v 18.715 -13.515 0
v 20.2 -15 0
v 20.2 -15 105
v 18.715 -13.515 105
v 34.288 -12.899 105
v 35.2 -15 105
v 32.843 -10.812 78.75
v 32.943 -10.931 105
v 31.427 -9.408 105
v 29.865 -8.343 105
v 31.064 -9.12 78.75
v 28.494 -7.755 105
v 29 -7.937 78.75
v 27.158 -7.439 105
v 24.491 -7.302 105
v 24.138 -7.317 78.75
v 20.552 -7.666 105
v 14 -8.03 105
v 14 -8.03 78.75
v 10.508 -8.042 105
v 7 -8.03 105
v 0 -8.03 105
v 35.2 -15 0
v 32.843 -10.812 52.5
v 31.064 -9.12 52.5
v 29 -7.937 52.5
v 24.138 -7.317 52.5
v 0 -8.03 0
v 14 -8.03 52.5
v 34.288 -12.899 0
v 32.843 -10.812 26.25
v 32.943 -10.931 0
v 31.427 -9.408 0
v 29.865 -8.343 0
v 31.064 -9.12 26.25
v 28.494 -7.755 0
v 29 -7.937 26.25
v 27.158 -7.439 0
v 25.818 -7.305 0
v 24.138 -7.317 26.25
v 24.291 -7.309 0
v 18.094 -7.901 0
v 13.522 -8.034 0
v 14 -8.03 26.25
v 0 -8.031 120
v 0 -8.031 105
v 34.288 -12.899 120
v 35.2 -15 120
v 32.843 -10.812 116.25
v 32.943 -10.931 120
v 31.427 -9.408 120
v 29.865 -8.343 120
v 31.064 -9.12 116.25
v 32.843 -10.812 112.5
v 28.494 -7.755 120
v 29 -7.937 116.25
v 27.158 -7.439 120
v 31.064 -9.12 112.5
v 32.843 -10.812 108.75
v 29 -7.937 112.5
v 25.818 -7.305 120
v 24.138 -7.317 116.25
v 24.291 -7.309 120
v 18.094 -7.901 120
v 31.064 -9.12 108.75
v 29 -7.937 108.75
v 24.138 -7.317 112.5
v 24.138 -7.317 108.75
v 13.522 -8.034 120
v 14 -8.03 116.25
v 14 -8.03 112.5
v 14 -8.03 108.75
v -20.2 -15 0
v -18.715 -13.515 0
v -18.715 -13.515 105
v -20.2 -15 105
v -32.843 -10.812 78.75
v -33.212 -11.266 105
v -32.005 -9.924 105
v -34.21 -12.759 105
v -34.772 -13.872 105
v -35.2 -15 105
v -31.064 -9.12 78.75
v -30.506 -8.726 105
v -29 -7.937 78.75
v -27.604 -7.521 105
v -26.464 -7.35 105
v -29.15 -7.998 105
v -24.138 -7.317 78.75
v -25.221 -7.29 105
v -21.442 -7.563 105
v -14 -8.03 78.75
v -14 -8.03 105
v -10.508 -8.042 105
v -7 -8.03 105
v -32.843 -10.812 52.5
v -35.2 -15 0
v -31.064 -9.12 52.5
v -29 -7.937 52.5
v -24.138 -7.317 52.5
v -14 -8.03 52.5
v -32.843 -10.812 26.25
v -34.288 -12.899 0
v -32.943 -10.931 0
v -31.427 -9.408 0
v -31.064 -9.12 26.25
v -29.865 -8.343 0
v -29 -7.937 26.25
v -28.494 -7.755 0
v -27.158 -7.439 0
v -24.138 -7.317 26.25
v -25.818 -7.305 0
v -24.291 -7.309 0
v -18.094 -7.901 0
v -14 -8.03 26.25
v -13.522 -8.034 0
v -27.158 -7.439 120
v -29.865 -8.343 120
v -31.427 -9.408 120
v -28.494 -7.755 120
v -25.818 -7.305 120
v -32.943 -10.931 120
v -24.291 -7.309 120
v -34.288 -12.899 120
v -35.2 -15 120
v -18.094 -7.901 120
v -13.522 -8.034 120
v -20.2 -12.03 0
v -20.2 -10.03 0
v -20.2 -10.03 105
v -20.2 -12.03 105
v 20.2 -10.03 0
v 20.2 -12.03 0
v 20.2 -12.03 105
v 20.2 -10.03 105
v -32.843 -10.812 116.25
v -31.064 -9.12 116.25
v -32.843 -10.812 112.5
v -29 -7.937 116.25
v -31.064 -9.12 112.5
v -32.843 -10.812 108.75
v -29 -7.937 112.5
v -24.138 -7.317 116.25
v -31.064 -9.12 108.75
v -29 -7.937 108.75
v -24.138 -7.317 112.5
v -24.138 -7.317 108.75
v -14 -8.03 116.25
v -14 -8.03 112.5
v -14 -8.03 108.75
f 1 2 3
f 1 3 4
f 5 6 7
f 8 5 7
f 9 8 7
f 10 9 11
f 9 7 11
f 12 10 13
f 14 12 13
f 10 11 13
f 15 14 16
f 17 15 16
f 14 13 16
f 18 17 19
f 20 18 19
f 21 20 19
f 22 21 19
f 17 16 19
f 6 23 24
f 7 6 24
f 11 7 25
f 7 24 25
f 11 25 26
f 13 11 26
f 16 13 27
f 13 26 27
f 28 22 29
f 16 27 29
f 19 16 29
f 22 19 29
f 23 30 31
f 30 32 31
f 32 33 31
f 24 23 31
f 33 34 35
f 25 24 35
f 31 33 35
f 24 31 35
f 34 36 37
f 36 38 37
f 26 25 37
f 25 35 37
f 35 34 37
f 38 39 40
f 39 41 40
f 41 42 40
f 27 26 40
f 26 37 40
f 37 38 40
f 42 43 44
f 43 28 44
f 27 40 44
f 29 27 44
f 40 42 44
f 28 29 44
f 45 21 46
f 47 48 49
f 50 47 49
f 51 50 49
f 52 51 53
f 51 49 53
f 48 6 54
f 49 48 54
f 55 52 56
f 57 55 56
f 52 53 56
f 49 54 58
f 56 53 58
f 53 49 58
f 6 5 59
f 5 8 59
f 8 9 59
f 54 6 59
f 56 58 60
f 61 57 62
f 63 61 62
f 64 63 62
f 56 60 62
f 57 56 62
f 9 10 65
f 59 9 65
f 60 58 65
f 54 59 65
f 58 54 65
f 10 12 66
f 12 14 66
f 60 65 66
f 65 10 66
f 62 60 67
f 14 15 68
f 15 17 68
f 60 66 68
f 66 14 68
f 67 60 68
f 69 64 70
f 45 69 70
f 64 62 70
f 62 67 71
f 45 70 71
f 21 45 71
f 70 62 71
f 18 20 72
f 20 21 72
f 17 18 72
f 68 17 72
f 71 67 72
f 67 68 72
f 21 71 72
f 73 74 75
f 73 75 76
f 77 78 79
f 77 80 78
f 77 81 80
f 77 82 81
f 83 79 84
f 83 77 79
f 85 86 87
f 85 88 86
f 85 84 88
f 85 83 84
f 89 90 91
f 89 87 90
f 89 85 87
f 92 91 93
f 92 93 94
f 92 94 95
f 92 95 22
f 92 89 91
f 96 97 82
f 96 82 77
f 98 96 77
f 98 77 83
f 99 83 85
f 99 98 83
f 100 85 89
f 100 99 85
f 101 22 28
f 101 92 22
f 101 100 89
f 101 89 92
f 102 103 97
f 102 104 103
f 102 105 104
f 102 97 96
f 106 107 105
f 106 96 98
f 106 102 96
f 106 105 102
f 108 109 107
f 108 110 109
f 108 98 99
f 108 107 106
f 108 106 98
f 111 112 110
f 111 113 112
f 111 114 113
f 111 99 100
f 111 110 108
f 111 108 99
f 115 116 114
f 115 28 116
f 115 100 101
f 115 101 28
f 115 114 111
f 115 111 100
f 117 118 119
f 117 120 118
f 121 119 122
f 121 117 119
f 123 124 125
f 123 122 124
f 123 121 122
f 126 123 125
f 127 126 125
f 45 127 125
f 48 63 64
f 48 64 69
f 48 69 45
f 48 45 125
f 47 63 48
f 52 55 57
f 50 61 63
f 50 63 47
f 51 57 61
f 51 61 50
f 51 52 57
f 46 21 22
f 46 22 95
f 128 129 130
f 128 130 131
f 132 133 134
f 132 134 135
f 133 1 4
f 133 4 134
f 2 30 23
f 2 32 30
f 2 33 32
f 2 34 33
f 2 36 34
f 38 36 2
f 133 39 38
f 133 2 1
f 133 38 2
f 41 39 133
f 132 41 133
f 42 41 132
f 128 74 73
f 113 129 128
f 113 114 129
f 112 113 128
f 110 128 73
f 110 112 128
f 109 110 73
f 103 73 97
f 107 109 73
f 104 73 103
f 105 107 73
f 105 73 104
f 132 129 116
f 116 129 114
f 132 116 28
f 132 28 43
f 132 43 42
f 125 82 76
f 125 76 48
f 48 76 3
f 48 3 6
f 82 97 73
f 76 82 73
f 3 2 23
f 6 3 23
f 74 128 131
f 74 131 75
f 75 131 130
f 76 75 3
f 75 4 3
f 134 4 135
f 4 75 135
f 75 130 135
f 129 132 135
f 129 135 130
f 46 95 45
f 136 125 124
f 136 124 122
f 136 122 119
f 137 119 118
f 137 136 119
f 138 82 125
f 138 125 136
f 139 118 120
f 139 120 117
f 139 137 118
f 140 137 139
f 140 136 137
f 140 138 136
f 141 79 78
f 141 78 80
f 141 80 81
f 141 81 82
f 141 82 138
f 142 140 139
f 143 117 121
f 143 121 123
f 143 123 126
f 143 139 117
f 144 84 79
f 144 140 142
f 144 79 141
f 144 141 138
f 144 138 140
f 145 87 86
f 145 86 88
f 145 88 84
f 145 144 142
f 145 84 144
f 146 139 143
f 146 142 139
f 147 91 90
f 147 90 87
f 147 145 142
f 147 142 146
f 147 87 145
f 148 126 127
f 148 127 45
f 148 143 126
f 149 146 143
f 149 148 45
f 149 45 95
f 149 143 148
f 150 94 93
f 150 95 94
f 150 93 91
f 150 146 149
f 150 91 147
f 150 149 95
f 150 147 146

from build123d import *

# Parameters (mm, degrees)
CORPO_DA_TAMPA_DEPTH = 105
TAMPA_SUPERIOR_DEPTH = 15


with BuildPart() as part:
    # Forma Principal → Corpo da Tampa (new body)
    with BuildSketch(Plane.XY):
        with BuildLine():
            Line((20.2, -12.030151519), (20.2, -10.030151519))
            Line((20.2, -10.030151519), (-20.2, -10.030151519))
            Line((-20.2, -10.030151519), (-20.2, -12.030151519))
            Line((-20.2, -12.030151519), (-18.71507576, -13.51507576))
            Line((-18.71507576, -13.51507576), (-20.2, -15))
            Line((-20.2, -15), (-35.2, -15))
            add(Edge.make_bspline(
                [(-35.2, -15), (-34.280475344, -12.093745364), (-29.42443277, -5.970228208), (-20.594092613, -7.920417436), (-11.051499012, -8.103133806), (-4.637412791, -7.987592699), (0, -8.030151519)],
                knots=[0, 0, 0, 0, 0.248741102, 0.507769796, 0.63738037, 1, 1, 1, 1], degree=3))
            add(Edge.make_bspline(
                [(35.2, -15), (34.280475344, -12.093745364), (29.42443277, -5.970228208), (20.594092613, -7.920417436), (11.051499012, -8.103133806), (4.637412791, -7.987592699), (0, -8.030151519)],
                knots=[0, 0, 0, 0, 0.248741102, 0.507769796, 0.63738037, 1, 1, 1, 1], degree=3))
            Line((35.2, -15), (20.2, -15))
            Line((20.2, -15), (18.71507576, -13.51507576))
            Line((18.71507576, -13.51507576), (20.2, -12.030151519))
        make_face()
    extrude(amount=CORPO_DA_TAMPA_DEPTH)

    # Esboço4 → Tampa Superior (add)
    with BuildSketch(Plane.XY.offset(105)):
        with BuildLine():
            Line((-35.2, -15), (35.2, -15))
            add(Edge.make_bspline(
                [(35.2, -15), (34.280475344, -12.093744684), (29.42443277, -5.97023045), (20.594092612, -7.920411928), (11.051499009, -8.103149978), (4.637412781, -7.987486804), (0, -8.030517111)],
                knots=[0, 0, 0, 0, 0.248741102, 0.507769796, 0.63738037, 1, 1, 1, 1], degree=3))
            add(Edge.make_bspline(
                [(-35.2, -15), (-34.280475344, -12.093744684), (-29.42443277, -5.97023045), (-20.594092612, -7.920411928), (-11.051499009, -8.103149978), (-4.637412781, -7.987486804), (0, -8.030517111)],
                knots=[0, 0, 0, 0, 0.248741102, 0.507769796, 0.63738037, 1, 1, 1, 1], degree=3))
        make_face()
    extrude(amount=TAMPA_SUPERIOR_DEPTH)


solid = part.part
